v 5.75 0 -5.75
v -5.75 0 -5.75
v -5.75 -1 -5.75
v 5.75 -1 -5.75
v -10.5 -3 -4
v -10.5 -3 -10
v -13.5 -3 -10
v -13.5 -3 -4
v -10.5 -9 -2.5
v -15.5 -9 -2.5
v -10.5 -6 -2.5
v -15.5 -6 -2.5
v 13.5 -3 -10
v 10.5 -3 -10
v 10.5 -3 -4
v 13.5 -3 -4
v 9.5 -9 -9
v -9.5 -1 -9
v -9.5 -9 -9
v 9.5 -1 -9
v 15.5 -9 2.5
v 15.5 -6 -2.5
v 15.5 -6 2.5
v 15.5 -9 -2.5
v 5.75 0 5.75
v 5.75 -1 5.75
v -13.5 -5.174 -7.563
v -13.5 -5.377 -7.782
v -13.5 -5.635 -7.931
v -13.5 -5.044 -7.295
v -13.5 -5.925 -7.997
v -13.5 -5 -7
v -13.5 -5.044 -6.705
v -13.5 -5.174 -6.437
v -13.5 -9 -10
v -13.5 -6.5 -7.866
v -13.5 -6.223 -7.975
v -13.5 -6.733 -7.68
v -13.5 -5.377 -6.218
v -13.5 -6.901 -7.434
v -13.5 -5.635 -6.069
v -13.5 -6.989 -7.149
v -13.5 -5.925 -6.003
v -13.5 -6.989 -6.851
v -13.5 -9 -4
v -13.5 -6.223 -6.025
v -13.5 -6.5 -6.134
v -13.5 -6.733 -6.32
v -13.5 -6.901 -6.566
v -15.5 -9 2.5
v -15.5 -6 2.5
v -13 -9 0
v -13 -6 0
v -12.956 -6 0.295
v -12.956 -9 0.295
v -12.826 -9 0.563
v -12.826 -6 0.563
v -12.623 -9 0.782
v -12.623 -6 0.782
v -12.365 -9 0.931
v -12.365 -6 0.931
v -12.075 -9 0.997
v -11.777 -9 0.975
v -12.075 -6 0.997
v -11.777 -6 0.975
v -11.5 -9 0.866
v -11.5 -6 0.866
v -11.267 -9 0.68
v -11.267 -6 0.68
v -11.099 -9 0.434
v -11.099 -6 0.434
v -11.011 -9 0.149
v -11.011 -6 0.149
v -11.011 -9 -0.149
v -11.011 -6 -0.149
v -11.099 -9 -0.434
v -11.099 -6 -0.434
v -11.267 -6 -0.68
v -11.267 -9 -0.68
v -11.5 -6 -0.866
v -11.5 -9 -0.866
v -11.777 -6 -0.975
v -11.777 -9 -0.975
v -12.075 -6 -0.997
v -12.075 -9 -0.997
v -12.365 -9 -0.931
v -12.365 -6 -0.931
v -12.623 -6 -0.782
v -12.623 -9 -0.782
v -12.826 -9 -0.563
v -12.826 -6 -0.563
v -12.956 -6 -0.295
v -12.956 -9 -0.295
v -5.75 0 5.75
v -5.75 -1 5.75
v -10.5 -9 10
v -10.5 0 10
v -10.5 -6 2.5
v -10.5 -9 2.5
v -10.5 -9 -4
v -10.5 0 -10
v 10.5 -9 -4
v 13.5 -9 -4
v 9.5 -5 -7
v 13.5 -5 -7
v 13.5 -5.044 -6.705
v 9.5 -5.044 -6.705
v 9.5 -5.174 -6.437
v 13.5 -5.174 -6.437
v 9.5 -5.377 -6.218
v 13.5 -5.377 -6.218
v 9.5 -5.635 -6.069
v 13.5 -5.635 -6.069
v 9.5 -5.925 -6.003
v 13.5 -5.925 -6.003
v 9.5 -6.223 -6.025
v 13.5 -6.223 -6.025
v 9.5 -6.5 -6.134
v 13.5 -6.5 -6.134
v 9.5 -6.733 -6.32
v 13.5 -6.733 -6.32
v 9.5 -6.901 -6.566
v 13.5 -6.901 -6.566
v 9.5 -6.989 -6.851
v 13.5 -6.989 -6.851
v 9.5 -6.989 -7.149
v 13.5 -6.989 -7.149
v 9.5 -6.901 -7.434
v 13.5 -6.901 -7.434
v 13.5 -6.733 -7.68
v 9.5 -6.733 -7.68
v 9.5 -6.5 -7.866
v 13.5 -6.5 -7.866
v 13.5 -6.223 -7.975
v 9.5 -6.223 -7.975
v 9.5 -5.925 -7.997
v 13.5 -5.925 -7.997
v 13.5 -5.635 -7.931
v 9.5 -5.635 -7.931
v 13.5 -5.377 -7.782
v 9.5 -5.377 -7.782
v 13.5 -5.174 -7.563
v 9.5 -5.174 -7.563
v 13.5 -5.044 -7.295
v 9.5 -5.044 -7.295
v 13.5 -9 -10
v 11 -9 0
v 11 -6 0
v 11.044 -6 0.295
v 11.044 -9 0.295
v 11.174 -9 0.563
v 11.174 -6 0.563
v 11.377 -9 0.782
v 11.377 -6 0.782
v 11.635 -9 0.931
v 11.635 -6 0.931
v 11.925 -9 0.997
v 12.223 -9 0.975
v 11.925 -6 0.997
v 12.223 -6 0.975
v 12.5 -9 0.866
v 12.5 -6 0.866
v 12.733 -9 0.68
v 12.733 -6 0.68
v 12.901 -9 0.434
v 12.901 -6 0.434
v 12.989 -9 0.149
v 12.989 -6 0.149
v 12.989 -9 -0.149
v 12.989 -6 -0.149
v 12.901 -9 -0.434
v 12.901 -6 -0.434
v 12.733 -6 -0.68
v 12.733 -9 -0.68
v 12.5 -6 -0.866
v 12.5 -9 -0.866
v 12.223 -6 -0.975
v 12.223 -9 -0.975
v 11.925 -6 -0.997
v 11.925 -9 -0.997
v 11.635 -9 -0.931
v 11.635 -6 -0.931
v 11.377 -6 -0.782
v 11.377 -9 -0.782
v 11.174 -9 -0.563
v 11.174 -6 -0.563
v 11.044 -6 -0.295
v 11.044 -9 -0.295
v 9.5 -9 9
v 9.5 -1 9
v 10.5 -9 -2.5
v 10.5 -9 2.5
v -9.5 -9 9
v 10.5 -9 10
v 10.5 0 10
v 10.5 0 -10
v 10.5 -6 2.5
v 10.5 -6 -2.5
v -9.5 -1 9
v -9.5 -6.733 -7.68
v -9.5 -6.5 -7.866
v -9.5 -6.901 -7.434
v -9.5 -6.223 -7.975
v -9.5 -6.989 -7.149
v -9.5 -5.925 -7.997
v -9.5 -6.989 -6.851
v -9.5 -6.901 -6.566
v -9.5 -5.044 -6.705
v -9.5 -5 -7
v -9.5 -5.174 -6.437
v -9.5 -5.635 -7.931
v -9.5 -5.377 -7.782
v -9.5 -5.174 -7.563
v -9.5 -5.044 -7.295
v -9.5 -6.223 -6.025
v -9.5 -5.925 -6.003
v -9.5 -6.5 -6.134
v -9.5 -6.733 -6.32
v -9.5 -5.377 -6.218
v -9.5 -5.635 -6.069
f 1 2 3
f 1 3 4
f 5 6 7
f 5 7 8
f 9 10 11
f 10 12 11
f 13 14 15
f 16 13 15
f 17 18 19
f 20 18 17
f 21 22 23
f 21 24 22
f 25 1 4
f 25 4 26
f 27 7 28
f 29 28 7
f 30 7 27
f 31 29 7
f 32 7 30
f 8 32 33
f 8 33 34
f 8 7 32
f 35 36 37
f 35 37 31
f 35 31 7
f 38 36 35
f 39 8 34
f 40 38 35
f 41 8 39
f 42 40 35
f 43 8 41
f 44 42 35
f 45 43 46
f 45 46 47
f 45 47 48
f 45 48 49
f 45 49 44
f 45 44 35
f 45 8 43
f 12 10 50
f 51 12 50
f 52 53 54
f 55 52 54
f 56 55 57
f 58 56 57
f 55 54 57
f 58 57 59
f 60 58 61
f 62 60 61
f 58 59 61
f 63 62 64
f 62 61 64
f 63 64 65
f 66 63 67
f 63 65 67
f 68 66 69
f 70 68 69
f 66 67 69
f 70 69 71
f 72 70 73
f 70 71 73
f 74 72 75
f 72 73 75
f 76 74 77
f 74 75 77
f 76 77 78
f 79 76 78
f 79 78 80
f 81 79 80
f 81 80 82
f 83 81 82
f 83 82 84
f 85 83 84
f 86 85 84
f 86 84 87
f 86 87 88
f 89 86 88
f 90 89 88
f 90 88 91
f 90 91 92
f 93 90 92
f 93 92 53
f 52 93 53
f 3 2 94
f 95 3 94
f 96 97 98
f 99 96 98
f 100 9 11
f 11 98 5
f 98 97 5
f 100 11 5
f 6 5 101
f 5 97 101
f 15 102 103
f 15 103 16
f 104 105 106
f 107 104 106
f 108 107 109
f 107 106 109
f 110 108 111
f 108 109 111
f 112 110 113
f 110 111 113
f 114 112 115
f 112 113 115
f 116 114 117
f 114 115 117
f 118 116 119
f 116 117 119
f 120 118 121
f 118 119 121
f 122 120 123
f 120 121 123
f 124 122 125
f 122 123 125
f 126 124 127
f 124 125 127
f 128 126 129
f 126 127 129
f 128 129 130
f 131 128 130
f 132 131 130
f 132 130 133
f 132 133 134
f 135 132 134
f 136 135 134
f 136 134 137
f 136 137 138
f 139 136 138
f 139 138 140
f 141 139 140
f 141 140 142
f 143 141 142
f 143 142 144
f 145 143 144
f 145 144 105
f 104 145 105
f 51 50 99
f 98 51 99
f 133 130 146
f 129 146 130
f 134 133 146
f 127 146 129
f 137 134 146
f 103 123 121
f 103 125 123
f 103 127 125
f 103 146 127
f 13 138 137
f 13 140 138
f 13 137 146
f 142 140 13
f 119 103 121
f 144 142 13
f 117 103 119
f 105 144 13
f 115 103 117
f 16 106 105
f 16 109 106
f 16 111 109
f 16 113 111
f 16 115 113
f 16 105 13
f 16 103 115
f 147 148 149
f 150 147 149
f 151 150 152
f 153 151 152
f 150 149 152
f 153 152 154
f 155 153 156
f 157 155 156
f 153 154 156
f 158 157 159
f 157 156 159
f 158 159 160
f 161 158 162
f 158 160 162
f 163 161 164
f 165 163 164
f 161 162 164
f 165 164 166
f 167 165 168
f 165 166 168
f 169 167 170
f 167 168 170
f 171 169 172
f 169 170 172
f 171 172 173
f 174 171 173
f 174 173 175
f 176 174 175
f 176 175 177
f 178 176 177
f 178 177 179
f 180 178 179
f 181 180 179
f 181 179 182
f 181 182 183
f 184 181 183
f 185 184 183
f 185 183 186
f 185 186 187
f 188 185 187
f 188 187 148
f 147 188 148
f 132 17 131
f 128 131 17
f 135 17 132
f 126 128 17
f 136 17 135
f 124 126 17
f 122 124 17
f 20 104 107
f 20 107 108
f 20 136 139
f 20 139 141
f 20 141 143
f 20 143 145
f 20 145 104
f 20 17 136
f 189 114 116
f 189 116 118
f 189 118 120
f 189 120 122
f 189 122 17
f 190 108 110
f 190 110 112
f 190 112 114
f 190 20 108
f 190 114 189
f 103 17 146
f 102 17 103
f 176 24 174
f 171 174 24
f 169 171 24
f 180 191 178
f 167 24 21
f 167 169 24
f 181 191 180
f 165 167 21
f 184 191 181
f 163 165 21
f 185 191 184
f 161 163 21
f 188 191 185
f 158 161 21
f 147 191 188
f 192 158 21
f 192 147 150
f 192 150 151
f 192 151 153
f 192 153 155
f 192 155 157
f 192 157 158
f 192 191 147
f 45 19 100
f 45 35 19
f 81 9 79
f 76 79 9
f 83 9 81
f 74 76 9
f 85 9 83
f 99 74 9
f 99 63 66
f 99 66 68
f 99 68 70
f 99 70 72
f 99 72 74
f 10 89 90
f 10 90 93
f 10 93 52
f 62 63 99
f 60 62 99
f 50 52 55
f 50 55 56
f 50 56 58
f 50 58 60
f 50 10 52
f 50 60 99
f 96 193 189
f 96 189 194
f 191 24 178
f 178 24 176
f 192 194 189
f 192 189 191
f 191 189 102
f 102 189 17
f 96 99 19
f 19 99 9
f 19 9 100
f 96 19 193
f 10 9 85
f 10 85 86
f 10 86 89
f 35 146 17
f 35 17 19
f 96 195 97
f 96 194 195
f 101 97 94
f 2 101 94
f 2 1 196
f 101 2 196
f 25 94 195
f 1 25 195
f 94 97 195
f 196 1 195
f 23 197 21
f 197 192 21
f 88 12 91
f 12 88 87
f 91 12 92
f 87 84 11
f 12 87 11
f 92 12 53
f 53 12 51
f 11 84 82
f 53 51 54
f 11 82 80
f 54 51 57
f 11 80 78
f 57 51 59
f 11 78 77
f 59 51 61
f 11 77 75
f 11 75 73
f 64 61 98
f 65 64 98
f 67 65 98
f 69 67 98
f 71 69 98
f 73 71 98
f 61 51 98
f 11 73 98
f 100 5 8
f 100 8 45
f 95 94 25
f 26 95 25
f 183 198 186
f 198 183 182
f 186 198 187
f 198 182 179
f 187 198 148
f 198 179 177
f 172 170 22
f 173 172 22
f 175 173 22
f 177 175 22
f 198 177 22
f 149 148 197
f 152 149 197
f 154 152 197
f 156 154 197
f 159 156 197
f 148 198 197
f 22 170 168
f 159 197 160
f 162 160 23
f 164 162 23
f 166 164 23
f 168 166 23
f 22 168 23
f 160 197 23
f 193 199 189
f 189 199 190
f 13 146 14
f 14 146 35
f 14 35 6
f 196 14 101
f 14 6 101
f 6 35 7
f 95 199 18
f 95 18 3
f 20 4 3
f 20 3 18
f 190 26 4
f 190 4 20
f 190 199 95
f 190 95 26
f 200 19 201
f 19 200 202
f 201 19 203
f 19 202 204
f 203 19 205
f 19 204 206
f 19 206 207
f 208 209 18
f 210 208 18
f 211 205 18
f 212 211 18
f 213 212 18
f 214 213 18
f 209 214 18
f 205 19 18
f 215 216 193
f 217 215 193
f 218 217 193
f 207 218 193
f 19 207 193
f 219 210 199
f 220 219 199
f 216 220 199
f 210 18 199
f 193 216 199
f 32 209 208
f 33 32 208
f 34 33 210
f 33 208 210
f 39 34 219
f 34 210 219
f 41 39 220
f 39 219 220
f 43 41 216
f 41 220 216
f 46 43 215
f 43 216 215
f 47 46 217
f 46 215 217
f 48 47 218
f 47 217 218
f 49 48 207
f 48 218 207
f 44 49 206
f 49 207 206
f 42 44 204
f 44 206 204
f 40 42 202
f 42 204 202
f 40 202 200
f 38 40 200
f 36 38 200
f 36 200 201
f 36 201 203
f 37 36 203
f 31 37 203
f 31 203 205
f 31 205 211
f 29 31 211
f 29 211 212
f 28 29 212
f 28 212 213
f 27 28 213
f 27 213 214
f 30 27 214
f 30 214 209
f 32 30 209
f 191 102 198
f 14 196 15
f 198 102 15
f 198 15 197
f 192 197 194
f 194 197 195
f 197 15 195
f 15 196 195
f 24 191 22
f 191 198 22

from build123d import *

# Parameters (mm, degrees)
F0_W          = 21
F0_H          = 20
F0_W_2        = 19
F0_H_2        = 18
F0_W_3        = 18
F0_H_3        = 17
F0_W_4        = 11.5
F0_H_4        = 11.5
F1_DEPTH      = 1
F2_W          = 21
F2_H          = 20
F2_W_2        = 19
F2_H_2        = 18
F3_DEPTH      = 7
F4_W          = 19
F4_H          = 18
F4_W_2        = 5
F4_H_2        = 5
F5_DEPTH      = 1
F5_DEPTH_BACK = 2
F7_D          = 2
F8_W          = 6
F8_H          = 6
F9_DEPTH      = 3
F10_W         = 6
F10_H         = 6
F11_DEPTH     = 3
F13_D         = 2


with BuildPart() as f1:
    # F0 (on Front) → F1 (new body)
    with BuildSketch(Plane.XZ):
        Rectangle(F0_W, F0_H)
        Rectangle(F0_W_2, F0_H_2, mode=Mode.SUBTRACT)
        Rectangle(F0_W_2, F0_H_2)
        Rectangle(F0_W_3, F0_H_3, mode=Mode.SUBTRACT)
        Rectangle(F0_W_3, F0_H_3)
        Rectangle(F0_W_4, F0_H_4, mode=Mode.SUBTRACT)
    extrude(amount=F1_DEPTH)

    # F2 (on face) → F3 (join)
    with BuildSketch(Plane.XZ.offset(1)):
        Rectangle(F2_W, F2_H)
        Rectangle(F2_W_2, F2_H_2, mode=Mode.SUBTRACT)
    extrude(amount=F3_DEPTH)

    # F4 (on face) → F5 (join, two sides)
    with BuildSketch(Plane.XZ.offset(8)) as f5_sk:
        Polygon((10.5, 2.5), (10.5, 10), (-10.5, 10), (-10.5, 2.5), (-10.5, -2.5), (-10.5, -10), (10.5, -10), (10.5, -2.5), align=None)
        Rectangle(F4_W, F4_H, mode=Mode.SUBTRACT)
        with Locations((13, 0)):
            Rectangle(F4_W_2, F4_H_2)
        with Locations((-13, 0)):
            Rectangle(F4_W_2, F4_H_2)
    extrude(amount=F5_DEPTH)
    extrude(f5_sk.sketch, amount=-F5_DEPTH_BACK)

    # F7 (through all)
    with Locations(Plane.XZ.offset(9)):
        with Locations((-12, 0), (12, 0)):
            Hole(F7_D / 2)

    # F8 (on face) → F9 (join)
    with BuildSketch(Plane(origin=(-10.5, 0, 0), x_dir=(0, -1, 0), z_dir=(-1, 0, 0))):
        with Locations((6, -7)):
            Rectangle(F8_W, F8_H)
    extrude(amount=F9_DEPTH)

    # F10 (on face) → F11 (join)
    with BuildSketch(Plane.YZ.offset(10.5)):
        with Locations((-6, -7)):
            Rectangle(F10_W, F10_H)
    extrude(amount=F11_DEPTH)

    # F13 (through all)
    with Locations(Plane(origin=(-13.5, 0, 0), x_dir=(0, -1, 0), z_dir=(-1, 0, 0))):
        with Locations((6, -7)):
            Hole(F13_D / 2)


solid = f1.part
